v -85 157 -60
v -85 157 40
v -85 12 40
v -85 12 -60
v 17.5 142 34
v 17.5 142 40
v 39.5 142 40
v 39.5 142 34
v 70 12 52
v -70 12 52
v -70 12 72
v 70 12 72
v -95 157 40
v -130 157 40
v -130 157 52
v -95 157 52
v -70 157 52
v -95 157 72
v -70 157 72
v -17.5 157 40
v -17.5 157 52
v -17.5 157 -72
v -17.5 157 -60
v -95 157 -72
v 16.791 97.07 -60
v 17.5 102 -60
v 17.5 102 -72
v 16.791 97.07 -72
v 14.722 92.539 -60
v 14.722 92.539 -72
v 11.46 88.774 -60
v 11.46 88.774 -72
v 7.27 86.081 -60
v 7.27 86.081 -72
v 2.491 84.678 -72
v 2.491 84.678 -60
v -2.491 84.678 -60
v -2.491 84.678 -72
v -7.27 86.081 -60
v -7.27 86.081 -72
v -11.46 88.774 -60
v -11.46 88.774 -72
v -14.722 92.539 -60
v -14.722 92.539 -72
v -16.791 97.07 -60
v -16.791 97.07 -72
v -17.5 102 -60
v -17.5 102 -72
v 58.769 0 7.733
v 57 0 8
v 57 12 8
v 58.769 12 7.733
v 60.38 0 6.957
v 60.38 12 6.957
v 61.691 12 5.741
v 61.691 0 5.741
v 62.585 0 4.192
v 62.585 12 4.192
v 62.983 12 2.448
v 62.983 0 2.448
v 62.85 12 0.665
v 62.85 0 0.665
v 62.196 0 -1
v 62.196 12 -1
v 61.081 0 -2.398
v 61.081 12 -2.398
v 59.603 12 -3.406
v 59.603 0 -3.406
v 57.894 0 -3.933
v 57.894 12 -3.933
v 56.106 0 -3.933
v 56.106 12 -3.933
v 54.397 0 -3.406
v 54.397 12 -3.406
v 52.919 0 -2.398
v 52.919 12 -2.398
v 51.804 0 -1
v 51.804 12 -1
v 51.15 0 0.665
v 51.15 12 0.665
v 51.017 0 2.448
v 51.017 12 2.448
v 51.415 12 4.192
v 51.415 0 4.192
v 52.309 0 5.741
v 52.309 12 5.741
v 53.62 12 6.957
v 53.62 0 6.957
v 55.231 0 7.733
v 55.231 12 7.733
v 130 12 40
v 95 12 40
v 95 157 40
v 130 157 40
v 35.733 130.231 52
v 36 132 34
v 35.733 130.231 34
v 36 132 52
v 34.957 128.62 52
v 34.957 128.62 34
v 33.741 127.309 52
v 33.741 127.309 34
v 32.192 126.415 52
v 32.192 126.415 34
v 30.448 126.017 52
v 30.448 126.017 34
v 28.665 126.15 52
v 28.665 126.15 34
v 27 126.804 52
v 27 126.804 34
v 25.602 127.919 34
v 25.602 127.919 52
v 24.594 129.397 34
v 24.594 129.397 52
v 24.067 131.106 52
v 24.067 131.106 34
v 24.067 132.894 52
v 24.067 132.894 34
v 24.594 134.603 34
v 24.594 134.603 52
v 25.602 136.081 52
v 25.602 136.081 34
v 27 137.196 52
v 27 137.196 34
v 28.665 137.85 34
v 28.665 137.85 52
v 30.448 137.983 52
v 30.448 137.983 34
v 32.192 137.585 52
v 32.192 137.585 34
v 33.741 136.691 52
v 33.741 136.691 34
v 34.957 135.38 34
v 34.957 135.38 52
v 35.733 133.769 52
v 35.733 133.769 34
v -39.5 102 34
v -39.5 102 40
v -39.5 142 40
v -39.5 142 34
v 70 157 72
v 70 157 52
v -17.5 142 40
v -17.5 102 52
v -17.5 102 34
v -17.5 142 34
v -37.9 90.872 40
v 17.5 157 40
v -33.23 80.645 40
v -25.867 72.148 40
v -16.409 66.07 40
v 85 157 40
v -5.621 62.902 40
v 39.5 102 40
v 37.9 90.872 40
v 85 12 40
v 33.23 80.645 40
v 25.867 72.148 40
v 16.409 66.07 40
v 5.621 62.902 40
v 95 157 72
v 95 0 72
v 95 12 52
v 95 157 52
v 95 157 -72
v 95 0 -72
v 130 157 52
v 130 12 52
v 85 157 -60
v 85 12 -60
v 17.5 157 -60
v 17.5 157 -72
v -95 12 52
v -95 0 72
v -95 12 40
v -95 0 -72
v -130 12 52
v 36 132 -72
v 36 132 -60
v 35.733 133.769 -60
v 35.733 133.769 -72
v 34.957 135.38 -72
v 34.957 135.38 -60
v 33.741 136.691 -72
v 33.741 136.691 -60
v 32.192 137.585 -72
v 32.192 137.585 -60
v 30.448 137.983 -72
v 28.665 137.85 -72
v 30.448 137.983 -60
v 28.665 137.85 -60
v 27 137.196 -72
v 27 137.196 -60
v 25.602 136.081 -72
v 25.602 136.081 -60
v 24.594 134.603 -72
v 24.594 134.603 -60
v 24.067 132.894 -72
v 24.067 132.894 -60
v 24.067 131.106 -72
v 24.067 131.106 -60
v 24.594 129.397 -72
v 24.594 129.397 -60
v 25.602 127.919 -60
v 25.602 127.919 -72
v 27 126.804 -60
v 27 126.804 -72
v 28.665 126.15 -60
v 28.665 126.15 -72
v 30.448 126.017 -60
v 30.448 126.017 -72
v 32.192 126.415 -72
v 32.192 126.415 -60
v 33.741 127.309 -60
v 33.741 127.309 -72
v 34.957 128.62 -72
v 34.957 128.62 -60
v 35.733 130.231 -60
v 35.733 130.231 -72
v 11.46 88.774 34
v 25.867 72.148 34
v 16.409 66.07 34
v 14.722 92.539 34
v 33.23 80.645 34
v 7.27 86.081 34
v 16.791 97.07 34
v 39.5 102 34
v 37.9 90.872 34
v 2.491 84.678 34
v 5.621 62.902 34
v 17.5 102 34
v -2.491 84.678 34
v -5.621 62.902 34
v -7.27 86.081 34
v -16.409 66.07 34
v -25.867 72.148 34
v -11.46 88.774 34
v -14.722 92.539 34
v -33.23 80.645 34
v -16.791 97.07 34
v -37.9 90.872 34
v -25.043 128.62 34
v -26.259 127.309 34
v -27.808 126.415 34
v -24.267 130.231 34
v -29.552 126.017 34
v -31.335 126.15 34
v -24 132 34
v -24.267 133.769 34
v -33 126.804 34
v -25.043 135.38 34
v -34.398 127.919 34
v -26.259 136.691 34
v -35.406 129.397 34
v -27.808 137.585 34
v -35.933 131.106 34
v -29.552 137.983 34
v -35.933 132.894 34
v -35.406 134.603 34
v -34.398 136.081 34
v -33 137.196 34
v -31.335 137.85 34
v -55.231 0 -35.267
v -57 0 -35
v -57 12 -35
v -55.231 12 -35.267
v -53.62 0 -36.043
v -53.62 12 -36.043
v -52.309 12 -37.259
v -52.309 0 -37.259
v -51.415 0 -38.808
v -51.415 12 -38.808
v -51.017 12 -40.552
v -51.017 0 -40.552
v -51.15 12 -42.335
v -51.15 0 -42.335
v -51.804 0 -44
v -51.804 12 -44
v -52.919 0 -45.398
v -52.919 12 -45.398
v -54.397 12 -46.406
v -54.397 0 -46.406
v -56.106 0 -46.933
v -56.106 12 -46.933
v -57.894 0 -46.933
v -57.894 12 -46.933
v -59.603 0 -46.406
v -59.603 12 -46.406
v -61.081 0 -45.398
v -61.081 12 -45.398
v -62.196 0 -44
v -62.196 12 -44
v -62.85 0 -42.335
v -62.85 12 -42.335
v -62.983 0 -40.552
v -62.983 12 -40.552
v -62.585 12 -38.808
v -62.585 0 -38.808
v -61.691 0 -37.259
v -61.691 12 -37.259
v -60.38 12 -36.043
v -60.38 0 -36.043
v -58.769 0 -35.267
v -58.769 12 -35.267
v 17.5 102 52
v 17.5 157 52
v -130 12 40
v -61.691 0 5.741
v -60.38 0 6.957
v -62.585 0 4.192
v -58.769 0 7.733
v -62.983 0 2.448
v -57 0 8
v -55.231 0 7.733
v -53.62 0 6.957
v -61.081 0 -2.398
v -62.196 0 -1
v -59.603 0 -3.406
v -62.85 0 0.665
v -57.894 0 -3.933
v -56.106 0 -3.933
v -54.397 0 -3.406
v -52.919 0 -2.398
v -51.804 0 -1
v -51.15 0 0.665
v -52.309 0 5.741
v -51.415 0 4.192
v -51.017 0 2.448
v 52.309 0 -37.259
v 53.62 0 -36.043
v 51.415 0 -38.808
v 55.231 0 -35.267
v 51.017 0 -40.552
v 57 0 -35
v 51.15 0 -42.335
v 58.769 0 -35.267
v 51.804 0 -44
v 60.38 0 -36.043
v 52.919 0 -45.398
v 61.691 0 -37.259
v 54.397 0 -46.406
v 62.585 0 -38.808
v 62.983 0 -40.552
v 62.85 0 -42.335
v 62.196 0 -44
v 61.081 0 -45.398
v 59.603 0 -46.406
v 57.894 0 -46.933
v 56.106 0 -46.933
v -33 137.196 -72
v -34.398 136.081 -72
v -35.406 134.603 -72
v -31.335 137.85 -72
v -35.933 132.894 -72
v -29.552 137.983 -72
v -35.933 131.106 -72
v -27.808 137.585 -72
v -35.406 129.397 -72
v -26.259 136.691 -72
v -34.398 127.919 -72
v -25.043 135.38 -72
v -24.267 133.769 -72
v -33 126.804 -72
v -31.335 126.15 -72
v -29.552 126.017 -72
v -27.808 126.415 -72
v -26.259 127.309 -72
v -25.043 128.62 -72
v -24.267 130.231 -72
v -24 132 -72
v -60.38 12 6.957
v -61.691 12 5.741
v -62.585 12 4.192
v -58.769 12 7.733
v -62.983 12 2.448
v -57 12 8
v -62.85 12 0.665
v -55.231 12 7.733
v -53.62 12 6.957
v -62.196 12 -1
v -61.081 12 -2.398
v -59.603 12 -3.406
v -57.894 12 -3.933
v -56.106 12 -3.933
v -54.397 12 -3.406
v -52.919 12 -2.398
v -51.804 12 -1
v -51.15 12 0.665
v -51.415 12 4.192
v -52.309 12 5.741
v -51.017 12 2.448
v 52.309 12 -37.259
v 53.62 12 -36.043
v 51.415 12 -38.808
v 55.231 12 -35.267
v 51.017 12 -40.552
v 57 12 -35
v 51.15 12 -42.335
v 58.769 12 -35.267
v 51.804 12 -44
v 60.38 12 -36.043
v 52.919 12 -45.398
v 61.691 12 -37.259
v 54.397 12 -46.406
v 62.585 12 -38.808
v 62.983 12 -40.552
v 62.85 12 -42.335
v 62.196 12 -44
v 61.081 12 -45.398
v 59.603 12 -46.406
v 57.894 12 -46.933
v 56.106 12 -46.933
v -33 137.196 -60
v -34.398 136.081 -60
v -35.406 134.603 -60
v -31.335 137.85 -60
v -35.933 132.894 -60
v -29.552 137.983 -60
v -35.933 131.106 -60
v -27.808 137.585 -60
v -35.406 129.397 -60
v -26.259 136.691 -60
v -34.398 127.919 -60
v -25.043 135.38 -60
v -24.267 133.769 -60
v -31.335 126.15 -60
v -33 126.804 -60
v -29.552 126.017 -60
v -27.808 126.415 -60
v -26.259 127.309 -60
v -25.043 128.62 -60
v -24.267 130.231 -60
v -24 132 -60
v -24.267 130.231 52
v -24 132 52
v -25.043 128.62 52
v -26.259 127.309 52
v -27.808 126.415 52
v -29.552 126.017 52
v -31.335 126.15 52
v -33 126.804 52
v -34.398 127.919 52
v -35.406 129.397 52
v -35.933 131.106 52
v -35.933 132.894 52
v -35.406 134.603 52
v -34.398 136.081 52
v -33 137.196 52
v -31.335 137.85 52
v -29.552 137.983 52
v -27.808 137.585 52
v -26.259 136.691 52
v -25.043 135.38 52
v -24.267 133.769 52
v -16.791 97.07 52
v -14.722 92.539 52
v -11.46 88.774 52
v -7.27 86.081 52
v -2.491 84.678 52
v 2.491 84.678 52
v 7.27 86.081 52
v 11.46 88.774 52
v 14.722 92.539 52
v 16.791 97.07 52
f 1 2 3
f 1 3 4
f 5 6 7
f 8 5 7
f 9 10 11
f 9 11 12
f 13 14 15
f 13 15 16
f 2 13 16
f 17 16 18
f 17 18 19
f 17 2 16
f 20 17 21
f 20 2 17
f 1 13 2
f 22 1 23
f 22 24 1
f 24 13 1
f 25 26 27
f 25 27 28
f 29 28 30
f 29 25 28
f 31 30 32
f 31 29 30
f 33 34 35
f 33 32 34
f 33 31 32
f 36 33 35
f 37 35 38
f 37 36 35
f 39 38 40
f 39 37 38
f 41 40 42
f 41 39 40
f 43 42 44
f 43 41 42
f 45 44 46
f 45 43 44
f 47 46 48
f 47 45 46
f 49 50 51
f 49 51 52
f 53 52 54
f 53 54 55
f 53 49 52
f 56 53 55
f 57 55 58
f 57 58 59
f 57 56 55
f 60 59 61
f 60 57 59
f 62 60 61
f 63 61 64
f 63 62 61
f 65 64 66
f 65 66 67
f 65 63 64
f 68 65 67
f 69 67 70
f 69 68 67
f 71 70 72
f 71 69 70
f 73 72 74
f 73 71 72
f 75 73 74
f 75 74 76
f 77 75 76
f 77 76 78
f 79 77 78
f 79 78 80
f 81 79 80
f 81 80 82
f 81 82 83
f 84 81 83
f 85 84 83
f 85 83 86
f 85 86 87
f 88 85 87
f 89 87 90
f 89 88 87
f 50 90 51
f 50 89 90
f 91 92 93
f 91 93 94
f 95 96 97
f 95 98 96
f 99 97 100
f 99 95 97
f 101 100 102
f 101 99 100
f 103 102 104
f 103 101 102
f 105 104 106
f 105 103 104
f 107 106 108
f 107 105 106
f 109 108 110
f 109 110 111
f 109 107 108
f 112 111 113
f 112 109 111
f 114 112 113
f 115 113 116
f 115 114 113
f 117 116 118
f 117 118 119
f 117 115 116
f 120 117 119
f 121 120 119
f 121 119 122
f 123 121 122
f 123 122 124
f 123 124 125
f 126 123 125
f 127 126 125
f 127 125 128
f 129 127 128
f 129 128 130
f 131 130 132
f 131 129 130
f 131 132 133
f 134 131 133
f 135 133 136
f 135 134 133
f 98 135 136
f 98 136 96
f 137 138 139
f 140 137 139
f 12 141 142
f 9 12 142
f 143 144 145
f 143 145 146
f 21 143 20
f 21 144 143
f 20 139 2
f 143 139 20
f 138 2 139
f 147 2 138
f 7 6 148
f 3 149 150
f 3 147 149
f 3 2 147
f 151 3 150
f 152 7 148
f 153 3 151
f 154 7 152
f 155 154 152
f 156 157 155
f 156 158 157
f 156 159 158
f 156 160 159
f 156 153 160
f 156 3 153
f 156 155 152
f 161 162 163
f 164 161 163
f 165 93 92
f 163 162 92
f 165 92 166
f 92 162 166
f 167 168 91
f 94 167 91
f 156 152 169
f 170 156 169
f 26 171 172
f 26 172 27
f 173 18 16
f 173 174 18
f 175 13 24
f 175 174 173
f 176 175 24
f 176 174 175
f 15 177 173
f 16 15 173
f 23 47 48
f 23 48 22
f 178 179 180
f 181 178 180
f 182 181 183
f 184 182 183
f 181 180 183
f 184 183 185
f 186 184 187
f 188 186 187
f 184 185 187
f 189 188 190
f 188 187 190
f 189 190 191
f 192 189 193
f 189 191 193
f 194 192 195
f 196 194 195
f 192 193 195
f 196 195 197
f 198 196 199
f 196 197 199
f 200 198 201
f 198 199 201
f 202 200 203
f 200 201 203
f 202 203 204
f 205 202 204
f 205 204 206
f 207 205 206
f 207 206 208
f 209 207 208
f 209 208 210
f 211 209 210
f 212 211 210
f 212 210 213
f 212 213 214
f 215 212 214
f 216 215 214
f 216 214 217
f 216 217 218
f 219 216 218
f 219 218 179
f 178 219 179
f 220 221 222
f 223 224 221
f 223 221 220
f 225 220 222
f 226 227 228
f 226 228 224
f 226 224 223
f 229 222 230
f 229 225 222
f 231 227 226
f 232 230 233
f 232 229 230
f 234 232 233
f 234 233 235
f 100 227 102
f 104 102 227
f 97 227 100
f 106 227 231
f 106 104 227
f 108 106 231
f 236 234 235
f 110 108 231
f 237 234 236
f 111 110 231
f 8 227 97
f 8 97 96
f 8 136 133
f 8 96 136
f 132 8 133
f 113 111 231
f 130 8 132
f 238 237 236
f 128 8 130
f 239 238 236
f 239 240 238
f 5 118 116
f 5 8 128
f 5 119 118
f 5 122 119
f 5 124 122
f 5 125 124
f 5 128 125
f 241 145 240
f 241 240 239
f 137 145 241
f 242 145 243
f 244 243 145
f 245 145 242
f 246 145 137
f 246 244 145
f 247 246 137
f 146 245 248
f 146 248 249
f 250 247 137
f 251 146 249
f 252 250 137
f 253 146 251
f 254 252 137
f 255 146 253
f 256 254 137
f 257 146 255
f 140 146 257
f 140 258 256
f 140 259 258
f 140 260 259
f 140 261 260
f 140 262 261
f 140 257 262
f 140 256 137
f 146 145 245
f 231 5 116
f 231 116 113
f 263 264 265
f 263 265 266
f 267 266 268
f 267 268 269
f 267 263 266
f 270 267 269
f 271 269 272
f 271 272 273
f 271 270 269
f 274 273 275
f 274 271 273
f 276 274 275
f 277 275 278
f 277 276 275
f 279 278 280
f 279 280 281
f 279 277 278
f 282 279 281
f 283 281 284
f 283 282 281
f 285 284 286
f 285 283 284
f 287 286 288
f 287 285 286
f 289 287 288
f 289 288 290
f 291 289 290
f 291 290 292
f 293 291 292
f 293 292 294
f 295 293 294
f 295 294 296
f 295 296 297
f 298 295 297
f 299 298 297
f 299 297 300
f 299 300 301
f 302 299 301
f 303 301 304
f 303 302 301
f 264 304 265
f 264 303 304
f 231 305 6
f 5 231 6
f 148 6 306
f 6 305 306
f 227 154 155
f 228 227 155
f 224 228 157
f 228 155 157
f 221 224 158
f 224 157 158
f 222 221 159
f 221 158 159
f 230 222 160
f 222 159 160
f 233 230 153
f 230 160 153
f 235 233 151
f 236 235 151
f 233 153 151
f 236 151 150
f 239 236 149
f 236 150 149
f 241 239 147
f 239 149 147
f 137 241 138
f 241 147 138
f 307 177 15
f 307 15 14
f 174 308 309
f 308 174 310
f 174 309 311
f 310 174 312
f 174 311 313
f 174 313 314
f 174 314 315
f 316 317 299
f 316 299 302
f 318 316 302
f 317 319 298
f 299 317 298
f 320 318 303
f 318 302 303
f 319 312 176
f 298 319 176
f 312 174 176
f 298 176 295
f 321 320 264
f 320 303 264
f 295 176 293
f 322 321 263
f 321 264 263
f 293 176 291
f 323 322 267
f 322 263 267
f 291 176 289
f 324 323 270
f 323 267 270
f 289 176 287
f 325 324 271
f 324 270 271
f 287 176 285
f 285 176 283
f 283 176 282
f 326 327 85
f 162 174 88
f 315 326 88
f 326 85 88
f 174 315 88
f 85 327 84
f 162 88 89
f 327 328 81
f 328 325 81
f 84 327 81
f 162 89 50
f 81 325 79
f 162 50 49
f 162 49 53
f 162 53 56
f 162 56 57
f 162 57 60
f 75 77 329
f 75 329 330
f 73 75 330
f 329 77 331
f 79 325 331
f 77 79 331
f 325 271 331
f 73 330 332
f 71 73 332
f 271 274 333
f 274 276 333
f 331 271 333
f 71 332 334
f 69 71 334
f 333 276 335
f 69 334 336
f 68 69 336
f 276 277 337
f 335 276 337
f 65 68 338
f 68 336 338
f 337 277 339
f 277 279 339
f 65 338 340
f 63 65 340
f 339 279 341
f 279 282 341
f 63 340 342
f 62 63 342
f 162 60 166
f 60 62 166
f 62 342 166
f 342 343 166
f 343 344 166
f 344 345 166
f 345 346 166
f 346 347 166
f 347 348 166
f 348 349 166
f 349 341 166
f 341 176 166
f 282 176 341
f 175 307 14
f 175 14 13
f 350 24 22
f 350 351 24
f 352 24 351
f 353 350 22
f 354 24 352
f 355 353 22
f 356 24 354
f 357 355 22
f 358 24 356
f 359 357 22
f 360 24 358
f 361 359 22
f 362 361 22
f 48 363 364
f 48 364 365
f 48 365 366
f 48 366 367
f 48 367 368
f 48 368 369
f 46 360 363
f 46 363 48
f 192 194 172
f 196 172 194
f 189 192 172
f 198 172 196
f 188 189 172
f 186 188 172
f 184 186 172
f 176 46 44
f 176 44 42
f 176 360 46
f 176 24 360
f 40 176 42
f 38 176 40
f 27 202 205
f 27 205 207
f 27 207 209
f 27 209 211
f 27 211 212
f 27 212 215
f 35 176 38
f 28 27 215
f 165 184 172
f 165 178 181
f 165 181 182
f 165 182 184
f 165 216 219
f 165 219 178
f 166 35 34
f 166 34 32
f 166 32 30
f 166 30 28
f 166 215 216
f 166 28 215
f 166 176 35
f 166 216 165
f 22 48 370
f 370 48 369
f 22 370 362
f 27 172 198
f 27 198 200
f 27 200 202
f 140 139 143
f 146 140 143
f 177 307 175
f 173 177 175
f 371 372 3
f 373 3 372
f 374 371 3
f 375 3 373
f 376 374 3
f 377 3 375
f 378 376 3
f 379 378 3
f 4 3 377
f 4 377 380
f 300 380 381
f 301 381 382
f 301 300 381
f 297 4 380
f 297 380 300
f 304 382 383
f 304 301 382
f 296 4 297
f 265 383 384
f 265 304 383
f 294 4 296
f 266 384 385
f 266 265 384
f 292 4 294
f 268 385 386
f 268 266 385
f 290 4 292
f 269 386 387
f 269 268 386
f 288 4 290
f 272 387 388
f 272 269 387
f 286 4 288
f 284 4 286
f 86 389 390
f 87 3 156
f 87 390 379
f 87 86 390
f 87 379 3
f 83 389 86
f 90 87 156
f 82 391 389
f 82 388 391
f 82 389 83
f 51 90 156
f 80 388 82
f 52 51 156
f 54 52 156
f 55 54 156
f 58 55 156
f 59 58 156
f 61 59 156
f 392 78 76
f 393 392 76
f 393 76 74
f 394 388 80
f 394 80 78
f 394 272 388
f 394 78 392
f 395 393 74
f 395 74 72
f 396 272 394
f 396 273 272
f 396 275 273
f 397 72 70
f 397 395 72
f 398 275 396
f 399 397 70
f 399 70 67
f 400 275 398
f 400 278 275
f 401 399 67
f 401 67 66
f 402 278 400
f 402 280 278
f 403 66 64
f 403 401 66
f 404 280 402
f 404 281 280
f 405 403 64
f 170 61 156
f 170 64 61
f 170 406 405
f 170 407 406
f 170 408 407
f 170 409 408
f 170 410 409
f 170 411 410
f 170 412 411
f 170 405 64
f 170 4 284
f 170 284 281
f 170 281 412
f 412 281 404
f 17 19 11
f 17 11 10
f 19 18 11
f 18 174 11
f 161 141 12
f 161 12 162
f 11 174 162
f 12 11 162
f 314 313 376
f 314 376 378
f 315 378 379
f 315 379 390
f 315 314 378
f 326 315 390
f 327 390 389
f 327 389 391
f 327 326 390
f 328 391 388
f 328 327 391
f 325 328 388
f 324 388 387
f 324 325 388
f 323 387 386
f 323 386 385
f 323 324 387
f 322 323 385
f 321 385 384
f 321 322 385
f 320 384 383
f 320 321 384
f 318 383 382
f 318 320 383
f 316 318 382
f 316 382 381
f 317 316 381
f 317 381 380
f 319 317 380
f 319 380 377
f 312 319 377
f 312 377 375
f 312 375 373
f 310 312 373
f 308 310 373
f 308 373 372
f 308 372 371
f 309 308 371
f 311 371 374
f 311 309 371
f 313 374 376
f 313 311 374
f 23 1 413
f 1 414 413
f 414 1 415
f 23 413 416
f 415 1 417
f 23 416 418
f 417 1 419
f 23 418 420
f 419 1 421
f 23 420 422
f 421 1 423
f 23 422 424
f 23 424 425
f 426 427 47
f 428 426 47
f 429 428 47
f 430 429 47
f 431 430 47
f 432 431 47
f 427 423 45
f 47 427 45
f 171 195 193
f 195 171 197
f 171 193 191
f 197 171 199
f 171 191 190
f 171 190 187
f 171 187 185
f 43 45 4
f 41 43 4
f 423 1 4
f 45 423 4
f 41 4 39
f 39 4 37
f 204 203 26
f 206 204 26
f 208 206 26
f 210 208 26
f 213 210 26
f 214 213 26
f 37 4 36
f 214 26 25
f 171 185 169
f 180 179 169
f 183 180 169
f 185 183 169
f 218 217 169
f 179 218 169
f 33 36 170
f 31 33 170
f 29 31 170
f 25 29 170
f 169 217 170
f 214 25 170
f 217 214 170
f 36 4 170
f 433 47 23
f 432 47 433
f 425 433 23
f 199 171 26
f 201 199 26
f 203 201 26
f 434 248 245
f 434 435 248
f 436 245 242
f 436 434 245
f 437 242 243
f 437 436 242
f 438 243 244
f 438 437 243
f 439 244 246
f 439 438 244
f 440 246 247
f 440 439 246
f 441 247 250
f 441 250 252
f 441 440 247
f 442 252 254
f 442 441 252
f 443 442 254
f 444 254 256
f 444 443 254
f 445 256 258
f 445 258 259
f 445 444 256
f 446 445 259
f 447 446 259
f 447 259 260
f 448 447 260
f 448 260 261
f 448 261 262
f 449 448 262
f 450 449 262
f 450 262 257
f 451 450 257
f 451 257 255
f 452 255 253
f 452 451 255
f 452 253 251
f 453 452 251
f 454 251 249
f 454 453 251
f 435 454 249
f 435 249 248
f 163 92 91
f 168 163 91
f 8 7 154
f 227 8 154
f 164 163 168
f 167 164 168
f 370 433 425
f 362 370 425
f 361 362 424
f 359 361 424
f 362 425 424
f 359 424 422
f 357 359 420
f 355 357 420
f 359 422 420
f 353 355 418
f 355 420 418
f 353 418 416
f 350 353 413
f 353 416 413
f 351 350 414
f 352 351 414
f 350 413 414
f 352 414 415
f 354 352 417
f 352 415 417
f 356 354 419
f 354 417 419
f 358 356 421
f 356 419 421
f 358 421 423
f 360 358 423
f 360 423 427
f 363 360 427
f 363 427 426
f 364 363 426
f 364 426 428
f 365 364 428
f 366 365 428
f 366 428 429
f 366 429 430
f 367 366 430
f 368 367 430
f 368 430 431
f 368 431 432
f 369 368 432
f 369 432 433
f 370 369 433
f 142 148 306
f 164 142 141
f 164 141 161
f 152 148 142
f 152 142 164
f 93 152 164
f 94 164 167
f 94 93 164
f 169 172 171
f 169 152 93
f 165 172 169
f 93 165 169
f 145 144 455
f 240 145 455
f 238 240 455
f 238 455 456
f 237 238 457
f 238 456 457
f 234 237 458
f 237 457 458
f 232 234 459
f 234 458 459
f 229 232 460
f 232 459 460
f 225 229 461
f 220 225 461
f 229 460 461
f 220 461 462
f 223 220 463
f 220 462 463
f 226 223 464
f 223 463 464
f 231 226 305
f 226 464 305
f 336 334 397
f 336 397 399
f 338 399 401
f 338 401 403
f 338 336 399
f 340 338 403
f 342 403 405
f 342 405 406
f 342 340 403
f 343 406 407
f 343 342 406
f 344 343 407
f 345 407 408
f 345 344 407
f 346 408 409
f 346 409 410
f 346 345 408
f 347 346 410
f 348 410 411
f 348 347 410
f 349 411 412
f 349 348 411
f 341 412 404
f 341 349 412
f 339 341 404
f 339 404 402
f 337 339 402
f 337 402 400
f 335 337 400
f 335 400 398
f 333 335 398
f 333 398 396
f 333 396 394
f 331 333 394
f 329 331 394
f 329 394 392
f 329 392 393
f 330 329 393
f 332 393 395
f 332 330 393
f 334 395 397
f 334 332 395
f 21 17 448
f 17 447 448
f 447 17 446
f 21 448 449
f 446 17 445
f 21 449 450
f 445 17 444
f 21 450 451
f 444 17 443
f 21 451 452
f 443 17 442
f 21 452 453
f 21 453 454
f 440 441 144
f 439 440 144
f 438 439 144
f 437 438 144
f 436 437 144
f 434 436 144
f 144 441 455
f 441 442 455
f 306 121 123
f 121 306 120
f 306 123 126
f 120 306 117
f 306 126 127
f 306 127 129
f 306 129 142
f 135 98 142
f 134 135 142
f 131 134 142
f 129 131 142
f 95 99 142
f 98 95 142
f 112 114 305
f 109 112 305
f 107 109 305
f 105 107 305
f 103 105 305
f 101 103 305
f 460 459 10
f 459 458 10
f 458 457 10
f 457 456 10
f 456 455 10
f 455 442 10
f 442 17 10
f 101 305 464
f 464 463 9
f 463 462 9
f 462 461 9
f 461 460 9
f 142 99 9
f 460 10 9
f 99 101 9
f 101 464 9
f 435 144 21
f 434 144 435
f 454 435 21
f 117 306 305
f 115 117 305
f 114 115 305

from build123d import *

# Parameters (mm, degrees)
SKETCH_1_W          = 190
SKETCH_1_H          = 144
SKETCH_1_R          = 6
EXTRUDE_1_DEPTH     = 12
SKETCH_2_W          = 190
SKETCH_2_H          = 12
SKETCH_2_W_2        = 260
EXTRUDE_2_DEPTH     = 145
SKETCH_3_R          = 6
CUT_EXTRUDE_1_DEPTH = 239.589605809
SKETCH_4_R          = 6
EXTRUDE_3_DEPTH     = 6
SKETCH_5_W          = 10
SKETCH_5_H          = 100
EXTRUDE_4_DEPTH     = 145
SKETCH_6_W          = 25
SKETCH_6_H          = 20
EXTRUDE_5_DEPTH     = 145


with BuildPart() as part:
    # 草图1 → 凸台-拉伸1 (new body)
    with BuildSketch(Plane(origin=(0, 0, 0), x_dir=(1, 0, 0), z_dir=(0, 1, 0))):
        Rectangle(SKETCH_1_W, SKETCH_1_H)
        with Locations(Location((-57, 41, 0), (0, 0, 270))):
            Circle(SKETCH_1_R, mode=Mode.SUBTRACT)
        with Locations(Location((57, 41, 0), (0, 0, 270))):
            Circle(SKETCH_1_R, mode=Mode.SUBTRACT)
        with Locations(Location((-57, -2, 0), (0, 0, 270))):
            Circle(SKETCH_1_R, mode=Mode.SUBTRACT)
        with Locations(Location((57, -2, 0), (0, 0, 270))):
            Circle(SKETCH_1_R, mode=Mode.SUBTRACT)
    extrude(amount=EXTRUDE_1_DEPTH)

    # 草图2 → 凸台-拉伸2 (add)
    with BuildSketch(Plane(origin=(0, 12, 0), x_dir=(1, 0, 0), z_dir=(0, 1, 0))):
        with Locations((0, 66)):
            Rectangle(SKETCH_2_W, SKETCH_2_H)
        with Locations((0, -46)):
            Rectangle(SKETCH_2_W_2, SKETCH_2_H)
    extrude(amount=EXTRUDE_2_DEPTH)

    # 草图3 → 切除-拉伸1 (cut, through all)
    with BuildSketch(Plane.XY.offset(52)):
        with Locations((-30, 132)):
            Circle(SKETCH_3_R)
        with Locations((30, 132)):
            Circle(SKETCH_3_R)
        with BuildLine():
            Line((-17.5, 157), (17.5, 157))
            Line((17.5, 157), (17.5, 102))
            ThreePointArc((17.5, 102), (0, 84.5), (-17.5, 102))
            Line((-17.5, 102), (-17.5, 157))
        make_face()
    extrude(amount=-CUT_EXTRUDE_1_DEPTH, mode=Mode.SUBTRACT)

    # 草图4 → 凸台-拉伸3 (add)
    with BuildSketch(Plane(origin=(0, 0, 40), x_dir=(-1, 0, 0), z_dir=(0, 0, -1))):
        with BuildLine():
            Line((-17.5, 142), (-39.5, 142))
            Line((-39.5, 142), (-39.5, 102))
            ThreePointArc((-39.5, 102), (0, 62.5), (39.5, 102))
            Line((39.5, 102), (39.5, 142))
            Line((39.5, 142), (17.5, 142))
            Line((17.5, 142), (17.5, 102))
            ThreePointArc((17.5, 102), (0, 84.5), (-17.5, 102))
            Line((-17.5, 102), (-17.5, 142))
        make_face()
        with Locations(Location((-30, 132, 0), (0, 0, 180))):
            Circle(SKETCH_4_R, mode=Mode.SUBTRACT)
        with Locations(Location((30, 132, 0), (0, 0, 180))):
            Circle(SKETCH_4_R, mode=Mode.SUBTRACT)
    extrude(amount=EXTRUDE_3_DEPTH)

    # 草图5 → 凸台-拉伸4 (add)
    with BuildSketch(Plane(origin=(0, 157, 0), x_dir=(1, 0, 0), z_dir=(0, 1, 0))):
        with Locations((-90, 10)):
            Rectangle(SKETCH_5_W, SKETCH_5_H)
        with Locations((90, 10)):
            Rectangle(SKETCH_5_W, SKETCH_5_H)
    extrude(amount=-EXTRUDE_4_DEPTH)

    # 草图6 → 凸台-拉伸5 (add)
    with BuildSketch(Plane(origin=(0, 12, 0), x_dir=(1, 0, 0), z_dir=(0, 1, 0))):
        with Locations((-82.5, -62)):
            Rectangle(SKETCH_6_W, SKETCH_6_H)
        with Locations((82.5, -62)):
            Rectangle(SKETCH_6_W, SKETCH_6_H)
    extrude(amount=EXTRUDE_5_DEPTH)


solid = part.part
